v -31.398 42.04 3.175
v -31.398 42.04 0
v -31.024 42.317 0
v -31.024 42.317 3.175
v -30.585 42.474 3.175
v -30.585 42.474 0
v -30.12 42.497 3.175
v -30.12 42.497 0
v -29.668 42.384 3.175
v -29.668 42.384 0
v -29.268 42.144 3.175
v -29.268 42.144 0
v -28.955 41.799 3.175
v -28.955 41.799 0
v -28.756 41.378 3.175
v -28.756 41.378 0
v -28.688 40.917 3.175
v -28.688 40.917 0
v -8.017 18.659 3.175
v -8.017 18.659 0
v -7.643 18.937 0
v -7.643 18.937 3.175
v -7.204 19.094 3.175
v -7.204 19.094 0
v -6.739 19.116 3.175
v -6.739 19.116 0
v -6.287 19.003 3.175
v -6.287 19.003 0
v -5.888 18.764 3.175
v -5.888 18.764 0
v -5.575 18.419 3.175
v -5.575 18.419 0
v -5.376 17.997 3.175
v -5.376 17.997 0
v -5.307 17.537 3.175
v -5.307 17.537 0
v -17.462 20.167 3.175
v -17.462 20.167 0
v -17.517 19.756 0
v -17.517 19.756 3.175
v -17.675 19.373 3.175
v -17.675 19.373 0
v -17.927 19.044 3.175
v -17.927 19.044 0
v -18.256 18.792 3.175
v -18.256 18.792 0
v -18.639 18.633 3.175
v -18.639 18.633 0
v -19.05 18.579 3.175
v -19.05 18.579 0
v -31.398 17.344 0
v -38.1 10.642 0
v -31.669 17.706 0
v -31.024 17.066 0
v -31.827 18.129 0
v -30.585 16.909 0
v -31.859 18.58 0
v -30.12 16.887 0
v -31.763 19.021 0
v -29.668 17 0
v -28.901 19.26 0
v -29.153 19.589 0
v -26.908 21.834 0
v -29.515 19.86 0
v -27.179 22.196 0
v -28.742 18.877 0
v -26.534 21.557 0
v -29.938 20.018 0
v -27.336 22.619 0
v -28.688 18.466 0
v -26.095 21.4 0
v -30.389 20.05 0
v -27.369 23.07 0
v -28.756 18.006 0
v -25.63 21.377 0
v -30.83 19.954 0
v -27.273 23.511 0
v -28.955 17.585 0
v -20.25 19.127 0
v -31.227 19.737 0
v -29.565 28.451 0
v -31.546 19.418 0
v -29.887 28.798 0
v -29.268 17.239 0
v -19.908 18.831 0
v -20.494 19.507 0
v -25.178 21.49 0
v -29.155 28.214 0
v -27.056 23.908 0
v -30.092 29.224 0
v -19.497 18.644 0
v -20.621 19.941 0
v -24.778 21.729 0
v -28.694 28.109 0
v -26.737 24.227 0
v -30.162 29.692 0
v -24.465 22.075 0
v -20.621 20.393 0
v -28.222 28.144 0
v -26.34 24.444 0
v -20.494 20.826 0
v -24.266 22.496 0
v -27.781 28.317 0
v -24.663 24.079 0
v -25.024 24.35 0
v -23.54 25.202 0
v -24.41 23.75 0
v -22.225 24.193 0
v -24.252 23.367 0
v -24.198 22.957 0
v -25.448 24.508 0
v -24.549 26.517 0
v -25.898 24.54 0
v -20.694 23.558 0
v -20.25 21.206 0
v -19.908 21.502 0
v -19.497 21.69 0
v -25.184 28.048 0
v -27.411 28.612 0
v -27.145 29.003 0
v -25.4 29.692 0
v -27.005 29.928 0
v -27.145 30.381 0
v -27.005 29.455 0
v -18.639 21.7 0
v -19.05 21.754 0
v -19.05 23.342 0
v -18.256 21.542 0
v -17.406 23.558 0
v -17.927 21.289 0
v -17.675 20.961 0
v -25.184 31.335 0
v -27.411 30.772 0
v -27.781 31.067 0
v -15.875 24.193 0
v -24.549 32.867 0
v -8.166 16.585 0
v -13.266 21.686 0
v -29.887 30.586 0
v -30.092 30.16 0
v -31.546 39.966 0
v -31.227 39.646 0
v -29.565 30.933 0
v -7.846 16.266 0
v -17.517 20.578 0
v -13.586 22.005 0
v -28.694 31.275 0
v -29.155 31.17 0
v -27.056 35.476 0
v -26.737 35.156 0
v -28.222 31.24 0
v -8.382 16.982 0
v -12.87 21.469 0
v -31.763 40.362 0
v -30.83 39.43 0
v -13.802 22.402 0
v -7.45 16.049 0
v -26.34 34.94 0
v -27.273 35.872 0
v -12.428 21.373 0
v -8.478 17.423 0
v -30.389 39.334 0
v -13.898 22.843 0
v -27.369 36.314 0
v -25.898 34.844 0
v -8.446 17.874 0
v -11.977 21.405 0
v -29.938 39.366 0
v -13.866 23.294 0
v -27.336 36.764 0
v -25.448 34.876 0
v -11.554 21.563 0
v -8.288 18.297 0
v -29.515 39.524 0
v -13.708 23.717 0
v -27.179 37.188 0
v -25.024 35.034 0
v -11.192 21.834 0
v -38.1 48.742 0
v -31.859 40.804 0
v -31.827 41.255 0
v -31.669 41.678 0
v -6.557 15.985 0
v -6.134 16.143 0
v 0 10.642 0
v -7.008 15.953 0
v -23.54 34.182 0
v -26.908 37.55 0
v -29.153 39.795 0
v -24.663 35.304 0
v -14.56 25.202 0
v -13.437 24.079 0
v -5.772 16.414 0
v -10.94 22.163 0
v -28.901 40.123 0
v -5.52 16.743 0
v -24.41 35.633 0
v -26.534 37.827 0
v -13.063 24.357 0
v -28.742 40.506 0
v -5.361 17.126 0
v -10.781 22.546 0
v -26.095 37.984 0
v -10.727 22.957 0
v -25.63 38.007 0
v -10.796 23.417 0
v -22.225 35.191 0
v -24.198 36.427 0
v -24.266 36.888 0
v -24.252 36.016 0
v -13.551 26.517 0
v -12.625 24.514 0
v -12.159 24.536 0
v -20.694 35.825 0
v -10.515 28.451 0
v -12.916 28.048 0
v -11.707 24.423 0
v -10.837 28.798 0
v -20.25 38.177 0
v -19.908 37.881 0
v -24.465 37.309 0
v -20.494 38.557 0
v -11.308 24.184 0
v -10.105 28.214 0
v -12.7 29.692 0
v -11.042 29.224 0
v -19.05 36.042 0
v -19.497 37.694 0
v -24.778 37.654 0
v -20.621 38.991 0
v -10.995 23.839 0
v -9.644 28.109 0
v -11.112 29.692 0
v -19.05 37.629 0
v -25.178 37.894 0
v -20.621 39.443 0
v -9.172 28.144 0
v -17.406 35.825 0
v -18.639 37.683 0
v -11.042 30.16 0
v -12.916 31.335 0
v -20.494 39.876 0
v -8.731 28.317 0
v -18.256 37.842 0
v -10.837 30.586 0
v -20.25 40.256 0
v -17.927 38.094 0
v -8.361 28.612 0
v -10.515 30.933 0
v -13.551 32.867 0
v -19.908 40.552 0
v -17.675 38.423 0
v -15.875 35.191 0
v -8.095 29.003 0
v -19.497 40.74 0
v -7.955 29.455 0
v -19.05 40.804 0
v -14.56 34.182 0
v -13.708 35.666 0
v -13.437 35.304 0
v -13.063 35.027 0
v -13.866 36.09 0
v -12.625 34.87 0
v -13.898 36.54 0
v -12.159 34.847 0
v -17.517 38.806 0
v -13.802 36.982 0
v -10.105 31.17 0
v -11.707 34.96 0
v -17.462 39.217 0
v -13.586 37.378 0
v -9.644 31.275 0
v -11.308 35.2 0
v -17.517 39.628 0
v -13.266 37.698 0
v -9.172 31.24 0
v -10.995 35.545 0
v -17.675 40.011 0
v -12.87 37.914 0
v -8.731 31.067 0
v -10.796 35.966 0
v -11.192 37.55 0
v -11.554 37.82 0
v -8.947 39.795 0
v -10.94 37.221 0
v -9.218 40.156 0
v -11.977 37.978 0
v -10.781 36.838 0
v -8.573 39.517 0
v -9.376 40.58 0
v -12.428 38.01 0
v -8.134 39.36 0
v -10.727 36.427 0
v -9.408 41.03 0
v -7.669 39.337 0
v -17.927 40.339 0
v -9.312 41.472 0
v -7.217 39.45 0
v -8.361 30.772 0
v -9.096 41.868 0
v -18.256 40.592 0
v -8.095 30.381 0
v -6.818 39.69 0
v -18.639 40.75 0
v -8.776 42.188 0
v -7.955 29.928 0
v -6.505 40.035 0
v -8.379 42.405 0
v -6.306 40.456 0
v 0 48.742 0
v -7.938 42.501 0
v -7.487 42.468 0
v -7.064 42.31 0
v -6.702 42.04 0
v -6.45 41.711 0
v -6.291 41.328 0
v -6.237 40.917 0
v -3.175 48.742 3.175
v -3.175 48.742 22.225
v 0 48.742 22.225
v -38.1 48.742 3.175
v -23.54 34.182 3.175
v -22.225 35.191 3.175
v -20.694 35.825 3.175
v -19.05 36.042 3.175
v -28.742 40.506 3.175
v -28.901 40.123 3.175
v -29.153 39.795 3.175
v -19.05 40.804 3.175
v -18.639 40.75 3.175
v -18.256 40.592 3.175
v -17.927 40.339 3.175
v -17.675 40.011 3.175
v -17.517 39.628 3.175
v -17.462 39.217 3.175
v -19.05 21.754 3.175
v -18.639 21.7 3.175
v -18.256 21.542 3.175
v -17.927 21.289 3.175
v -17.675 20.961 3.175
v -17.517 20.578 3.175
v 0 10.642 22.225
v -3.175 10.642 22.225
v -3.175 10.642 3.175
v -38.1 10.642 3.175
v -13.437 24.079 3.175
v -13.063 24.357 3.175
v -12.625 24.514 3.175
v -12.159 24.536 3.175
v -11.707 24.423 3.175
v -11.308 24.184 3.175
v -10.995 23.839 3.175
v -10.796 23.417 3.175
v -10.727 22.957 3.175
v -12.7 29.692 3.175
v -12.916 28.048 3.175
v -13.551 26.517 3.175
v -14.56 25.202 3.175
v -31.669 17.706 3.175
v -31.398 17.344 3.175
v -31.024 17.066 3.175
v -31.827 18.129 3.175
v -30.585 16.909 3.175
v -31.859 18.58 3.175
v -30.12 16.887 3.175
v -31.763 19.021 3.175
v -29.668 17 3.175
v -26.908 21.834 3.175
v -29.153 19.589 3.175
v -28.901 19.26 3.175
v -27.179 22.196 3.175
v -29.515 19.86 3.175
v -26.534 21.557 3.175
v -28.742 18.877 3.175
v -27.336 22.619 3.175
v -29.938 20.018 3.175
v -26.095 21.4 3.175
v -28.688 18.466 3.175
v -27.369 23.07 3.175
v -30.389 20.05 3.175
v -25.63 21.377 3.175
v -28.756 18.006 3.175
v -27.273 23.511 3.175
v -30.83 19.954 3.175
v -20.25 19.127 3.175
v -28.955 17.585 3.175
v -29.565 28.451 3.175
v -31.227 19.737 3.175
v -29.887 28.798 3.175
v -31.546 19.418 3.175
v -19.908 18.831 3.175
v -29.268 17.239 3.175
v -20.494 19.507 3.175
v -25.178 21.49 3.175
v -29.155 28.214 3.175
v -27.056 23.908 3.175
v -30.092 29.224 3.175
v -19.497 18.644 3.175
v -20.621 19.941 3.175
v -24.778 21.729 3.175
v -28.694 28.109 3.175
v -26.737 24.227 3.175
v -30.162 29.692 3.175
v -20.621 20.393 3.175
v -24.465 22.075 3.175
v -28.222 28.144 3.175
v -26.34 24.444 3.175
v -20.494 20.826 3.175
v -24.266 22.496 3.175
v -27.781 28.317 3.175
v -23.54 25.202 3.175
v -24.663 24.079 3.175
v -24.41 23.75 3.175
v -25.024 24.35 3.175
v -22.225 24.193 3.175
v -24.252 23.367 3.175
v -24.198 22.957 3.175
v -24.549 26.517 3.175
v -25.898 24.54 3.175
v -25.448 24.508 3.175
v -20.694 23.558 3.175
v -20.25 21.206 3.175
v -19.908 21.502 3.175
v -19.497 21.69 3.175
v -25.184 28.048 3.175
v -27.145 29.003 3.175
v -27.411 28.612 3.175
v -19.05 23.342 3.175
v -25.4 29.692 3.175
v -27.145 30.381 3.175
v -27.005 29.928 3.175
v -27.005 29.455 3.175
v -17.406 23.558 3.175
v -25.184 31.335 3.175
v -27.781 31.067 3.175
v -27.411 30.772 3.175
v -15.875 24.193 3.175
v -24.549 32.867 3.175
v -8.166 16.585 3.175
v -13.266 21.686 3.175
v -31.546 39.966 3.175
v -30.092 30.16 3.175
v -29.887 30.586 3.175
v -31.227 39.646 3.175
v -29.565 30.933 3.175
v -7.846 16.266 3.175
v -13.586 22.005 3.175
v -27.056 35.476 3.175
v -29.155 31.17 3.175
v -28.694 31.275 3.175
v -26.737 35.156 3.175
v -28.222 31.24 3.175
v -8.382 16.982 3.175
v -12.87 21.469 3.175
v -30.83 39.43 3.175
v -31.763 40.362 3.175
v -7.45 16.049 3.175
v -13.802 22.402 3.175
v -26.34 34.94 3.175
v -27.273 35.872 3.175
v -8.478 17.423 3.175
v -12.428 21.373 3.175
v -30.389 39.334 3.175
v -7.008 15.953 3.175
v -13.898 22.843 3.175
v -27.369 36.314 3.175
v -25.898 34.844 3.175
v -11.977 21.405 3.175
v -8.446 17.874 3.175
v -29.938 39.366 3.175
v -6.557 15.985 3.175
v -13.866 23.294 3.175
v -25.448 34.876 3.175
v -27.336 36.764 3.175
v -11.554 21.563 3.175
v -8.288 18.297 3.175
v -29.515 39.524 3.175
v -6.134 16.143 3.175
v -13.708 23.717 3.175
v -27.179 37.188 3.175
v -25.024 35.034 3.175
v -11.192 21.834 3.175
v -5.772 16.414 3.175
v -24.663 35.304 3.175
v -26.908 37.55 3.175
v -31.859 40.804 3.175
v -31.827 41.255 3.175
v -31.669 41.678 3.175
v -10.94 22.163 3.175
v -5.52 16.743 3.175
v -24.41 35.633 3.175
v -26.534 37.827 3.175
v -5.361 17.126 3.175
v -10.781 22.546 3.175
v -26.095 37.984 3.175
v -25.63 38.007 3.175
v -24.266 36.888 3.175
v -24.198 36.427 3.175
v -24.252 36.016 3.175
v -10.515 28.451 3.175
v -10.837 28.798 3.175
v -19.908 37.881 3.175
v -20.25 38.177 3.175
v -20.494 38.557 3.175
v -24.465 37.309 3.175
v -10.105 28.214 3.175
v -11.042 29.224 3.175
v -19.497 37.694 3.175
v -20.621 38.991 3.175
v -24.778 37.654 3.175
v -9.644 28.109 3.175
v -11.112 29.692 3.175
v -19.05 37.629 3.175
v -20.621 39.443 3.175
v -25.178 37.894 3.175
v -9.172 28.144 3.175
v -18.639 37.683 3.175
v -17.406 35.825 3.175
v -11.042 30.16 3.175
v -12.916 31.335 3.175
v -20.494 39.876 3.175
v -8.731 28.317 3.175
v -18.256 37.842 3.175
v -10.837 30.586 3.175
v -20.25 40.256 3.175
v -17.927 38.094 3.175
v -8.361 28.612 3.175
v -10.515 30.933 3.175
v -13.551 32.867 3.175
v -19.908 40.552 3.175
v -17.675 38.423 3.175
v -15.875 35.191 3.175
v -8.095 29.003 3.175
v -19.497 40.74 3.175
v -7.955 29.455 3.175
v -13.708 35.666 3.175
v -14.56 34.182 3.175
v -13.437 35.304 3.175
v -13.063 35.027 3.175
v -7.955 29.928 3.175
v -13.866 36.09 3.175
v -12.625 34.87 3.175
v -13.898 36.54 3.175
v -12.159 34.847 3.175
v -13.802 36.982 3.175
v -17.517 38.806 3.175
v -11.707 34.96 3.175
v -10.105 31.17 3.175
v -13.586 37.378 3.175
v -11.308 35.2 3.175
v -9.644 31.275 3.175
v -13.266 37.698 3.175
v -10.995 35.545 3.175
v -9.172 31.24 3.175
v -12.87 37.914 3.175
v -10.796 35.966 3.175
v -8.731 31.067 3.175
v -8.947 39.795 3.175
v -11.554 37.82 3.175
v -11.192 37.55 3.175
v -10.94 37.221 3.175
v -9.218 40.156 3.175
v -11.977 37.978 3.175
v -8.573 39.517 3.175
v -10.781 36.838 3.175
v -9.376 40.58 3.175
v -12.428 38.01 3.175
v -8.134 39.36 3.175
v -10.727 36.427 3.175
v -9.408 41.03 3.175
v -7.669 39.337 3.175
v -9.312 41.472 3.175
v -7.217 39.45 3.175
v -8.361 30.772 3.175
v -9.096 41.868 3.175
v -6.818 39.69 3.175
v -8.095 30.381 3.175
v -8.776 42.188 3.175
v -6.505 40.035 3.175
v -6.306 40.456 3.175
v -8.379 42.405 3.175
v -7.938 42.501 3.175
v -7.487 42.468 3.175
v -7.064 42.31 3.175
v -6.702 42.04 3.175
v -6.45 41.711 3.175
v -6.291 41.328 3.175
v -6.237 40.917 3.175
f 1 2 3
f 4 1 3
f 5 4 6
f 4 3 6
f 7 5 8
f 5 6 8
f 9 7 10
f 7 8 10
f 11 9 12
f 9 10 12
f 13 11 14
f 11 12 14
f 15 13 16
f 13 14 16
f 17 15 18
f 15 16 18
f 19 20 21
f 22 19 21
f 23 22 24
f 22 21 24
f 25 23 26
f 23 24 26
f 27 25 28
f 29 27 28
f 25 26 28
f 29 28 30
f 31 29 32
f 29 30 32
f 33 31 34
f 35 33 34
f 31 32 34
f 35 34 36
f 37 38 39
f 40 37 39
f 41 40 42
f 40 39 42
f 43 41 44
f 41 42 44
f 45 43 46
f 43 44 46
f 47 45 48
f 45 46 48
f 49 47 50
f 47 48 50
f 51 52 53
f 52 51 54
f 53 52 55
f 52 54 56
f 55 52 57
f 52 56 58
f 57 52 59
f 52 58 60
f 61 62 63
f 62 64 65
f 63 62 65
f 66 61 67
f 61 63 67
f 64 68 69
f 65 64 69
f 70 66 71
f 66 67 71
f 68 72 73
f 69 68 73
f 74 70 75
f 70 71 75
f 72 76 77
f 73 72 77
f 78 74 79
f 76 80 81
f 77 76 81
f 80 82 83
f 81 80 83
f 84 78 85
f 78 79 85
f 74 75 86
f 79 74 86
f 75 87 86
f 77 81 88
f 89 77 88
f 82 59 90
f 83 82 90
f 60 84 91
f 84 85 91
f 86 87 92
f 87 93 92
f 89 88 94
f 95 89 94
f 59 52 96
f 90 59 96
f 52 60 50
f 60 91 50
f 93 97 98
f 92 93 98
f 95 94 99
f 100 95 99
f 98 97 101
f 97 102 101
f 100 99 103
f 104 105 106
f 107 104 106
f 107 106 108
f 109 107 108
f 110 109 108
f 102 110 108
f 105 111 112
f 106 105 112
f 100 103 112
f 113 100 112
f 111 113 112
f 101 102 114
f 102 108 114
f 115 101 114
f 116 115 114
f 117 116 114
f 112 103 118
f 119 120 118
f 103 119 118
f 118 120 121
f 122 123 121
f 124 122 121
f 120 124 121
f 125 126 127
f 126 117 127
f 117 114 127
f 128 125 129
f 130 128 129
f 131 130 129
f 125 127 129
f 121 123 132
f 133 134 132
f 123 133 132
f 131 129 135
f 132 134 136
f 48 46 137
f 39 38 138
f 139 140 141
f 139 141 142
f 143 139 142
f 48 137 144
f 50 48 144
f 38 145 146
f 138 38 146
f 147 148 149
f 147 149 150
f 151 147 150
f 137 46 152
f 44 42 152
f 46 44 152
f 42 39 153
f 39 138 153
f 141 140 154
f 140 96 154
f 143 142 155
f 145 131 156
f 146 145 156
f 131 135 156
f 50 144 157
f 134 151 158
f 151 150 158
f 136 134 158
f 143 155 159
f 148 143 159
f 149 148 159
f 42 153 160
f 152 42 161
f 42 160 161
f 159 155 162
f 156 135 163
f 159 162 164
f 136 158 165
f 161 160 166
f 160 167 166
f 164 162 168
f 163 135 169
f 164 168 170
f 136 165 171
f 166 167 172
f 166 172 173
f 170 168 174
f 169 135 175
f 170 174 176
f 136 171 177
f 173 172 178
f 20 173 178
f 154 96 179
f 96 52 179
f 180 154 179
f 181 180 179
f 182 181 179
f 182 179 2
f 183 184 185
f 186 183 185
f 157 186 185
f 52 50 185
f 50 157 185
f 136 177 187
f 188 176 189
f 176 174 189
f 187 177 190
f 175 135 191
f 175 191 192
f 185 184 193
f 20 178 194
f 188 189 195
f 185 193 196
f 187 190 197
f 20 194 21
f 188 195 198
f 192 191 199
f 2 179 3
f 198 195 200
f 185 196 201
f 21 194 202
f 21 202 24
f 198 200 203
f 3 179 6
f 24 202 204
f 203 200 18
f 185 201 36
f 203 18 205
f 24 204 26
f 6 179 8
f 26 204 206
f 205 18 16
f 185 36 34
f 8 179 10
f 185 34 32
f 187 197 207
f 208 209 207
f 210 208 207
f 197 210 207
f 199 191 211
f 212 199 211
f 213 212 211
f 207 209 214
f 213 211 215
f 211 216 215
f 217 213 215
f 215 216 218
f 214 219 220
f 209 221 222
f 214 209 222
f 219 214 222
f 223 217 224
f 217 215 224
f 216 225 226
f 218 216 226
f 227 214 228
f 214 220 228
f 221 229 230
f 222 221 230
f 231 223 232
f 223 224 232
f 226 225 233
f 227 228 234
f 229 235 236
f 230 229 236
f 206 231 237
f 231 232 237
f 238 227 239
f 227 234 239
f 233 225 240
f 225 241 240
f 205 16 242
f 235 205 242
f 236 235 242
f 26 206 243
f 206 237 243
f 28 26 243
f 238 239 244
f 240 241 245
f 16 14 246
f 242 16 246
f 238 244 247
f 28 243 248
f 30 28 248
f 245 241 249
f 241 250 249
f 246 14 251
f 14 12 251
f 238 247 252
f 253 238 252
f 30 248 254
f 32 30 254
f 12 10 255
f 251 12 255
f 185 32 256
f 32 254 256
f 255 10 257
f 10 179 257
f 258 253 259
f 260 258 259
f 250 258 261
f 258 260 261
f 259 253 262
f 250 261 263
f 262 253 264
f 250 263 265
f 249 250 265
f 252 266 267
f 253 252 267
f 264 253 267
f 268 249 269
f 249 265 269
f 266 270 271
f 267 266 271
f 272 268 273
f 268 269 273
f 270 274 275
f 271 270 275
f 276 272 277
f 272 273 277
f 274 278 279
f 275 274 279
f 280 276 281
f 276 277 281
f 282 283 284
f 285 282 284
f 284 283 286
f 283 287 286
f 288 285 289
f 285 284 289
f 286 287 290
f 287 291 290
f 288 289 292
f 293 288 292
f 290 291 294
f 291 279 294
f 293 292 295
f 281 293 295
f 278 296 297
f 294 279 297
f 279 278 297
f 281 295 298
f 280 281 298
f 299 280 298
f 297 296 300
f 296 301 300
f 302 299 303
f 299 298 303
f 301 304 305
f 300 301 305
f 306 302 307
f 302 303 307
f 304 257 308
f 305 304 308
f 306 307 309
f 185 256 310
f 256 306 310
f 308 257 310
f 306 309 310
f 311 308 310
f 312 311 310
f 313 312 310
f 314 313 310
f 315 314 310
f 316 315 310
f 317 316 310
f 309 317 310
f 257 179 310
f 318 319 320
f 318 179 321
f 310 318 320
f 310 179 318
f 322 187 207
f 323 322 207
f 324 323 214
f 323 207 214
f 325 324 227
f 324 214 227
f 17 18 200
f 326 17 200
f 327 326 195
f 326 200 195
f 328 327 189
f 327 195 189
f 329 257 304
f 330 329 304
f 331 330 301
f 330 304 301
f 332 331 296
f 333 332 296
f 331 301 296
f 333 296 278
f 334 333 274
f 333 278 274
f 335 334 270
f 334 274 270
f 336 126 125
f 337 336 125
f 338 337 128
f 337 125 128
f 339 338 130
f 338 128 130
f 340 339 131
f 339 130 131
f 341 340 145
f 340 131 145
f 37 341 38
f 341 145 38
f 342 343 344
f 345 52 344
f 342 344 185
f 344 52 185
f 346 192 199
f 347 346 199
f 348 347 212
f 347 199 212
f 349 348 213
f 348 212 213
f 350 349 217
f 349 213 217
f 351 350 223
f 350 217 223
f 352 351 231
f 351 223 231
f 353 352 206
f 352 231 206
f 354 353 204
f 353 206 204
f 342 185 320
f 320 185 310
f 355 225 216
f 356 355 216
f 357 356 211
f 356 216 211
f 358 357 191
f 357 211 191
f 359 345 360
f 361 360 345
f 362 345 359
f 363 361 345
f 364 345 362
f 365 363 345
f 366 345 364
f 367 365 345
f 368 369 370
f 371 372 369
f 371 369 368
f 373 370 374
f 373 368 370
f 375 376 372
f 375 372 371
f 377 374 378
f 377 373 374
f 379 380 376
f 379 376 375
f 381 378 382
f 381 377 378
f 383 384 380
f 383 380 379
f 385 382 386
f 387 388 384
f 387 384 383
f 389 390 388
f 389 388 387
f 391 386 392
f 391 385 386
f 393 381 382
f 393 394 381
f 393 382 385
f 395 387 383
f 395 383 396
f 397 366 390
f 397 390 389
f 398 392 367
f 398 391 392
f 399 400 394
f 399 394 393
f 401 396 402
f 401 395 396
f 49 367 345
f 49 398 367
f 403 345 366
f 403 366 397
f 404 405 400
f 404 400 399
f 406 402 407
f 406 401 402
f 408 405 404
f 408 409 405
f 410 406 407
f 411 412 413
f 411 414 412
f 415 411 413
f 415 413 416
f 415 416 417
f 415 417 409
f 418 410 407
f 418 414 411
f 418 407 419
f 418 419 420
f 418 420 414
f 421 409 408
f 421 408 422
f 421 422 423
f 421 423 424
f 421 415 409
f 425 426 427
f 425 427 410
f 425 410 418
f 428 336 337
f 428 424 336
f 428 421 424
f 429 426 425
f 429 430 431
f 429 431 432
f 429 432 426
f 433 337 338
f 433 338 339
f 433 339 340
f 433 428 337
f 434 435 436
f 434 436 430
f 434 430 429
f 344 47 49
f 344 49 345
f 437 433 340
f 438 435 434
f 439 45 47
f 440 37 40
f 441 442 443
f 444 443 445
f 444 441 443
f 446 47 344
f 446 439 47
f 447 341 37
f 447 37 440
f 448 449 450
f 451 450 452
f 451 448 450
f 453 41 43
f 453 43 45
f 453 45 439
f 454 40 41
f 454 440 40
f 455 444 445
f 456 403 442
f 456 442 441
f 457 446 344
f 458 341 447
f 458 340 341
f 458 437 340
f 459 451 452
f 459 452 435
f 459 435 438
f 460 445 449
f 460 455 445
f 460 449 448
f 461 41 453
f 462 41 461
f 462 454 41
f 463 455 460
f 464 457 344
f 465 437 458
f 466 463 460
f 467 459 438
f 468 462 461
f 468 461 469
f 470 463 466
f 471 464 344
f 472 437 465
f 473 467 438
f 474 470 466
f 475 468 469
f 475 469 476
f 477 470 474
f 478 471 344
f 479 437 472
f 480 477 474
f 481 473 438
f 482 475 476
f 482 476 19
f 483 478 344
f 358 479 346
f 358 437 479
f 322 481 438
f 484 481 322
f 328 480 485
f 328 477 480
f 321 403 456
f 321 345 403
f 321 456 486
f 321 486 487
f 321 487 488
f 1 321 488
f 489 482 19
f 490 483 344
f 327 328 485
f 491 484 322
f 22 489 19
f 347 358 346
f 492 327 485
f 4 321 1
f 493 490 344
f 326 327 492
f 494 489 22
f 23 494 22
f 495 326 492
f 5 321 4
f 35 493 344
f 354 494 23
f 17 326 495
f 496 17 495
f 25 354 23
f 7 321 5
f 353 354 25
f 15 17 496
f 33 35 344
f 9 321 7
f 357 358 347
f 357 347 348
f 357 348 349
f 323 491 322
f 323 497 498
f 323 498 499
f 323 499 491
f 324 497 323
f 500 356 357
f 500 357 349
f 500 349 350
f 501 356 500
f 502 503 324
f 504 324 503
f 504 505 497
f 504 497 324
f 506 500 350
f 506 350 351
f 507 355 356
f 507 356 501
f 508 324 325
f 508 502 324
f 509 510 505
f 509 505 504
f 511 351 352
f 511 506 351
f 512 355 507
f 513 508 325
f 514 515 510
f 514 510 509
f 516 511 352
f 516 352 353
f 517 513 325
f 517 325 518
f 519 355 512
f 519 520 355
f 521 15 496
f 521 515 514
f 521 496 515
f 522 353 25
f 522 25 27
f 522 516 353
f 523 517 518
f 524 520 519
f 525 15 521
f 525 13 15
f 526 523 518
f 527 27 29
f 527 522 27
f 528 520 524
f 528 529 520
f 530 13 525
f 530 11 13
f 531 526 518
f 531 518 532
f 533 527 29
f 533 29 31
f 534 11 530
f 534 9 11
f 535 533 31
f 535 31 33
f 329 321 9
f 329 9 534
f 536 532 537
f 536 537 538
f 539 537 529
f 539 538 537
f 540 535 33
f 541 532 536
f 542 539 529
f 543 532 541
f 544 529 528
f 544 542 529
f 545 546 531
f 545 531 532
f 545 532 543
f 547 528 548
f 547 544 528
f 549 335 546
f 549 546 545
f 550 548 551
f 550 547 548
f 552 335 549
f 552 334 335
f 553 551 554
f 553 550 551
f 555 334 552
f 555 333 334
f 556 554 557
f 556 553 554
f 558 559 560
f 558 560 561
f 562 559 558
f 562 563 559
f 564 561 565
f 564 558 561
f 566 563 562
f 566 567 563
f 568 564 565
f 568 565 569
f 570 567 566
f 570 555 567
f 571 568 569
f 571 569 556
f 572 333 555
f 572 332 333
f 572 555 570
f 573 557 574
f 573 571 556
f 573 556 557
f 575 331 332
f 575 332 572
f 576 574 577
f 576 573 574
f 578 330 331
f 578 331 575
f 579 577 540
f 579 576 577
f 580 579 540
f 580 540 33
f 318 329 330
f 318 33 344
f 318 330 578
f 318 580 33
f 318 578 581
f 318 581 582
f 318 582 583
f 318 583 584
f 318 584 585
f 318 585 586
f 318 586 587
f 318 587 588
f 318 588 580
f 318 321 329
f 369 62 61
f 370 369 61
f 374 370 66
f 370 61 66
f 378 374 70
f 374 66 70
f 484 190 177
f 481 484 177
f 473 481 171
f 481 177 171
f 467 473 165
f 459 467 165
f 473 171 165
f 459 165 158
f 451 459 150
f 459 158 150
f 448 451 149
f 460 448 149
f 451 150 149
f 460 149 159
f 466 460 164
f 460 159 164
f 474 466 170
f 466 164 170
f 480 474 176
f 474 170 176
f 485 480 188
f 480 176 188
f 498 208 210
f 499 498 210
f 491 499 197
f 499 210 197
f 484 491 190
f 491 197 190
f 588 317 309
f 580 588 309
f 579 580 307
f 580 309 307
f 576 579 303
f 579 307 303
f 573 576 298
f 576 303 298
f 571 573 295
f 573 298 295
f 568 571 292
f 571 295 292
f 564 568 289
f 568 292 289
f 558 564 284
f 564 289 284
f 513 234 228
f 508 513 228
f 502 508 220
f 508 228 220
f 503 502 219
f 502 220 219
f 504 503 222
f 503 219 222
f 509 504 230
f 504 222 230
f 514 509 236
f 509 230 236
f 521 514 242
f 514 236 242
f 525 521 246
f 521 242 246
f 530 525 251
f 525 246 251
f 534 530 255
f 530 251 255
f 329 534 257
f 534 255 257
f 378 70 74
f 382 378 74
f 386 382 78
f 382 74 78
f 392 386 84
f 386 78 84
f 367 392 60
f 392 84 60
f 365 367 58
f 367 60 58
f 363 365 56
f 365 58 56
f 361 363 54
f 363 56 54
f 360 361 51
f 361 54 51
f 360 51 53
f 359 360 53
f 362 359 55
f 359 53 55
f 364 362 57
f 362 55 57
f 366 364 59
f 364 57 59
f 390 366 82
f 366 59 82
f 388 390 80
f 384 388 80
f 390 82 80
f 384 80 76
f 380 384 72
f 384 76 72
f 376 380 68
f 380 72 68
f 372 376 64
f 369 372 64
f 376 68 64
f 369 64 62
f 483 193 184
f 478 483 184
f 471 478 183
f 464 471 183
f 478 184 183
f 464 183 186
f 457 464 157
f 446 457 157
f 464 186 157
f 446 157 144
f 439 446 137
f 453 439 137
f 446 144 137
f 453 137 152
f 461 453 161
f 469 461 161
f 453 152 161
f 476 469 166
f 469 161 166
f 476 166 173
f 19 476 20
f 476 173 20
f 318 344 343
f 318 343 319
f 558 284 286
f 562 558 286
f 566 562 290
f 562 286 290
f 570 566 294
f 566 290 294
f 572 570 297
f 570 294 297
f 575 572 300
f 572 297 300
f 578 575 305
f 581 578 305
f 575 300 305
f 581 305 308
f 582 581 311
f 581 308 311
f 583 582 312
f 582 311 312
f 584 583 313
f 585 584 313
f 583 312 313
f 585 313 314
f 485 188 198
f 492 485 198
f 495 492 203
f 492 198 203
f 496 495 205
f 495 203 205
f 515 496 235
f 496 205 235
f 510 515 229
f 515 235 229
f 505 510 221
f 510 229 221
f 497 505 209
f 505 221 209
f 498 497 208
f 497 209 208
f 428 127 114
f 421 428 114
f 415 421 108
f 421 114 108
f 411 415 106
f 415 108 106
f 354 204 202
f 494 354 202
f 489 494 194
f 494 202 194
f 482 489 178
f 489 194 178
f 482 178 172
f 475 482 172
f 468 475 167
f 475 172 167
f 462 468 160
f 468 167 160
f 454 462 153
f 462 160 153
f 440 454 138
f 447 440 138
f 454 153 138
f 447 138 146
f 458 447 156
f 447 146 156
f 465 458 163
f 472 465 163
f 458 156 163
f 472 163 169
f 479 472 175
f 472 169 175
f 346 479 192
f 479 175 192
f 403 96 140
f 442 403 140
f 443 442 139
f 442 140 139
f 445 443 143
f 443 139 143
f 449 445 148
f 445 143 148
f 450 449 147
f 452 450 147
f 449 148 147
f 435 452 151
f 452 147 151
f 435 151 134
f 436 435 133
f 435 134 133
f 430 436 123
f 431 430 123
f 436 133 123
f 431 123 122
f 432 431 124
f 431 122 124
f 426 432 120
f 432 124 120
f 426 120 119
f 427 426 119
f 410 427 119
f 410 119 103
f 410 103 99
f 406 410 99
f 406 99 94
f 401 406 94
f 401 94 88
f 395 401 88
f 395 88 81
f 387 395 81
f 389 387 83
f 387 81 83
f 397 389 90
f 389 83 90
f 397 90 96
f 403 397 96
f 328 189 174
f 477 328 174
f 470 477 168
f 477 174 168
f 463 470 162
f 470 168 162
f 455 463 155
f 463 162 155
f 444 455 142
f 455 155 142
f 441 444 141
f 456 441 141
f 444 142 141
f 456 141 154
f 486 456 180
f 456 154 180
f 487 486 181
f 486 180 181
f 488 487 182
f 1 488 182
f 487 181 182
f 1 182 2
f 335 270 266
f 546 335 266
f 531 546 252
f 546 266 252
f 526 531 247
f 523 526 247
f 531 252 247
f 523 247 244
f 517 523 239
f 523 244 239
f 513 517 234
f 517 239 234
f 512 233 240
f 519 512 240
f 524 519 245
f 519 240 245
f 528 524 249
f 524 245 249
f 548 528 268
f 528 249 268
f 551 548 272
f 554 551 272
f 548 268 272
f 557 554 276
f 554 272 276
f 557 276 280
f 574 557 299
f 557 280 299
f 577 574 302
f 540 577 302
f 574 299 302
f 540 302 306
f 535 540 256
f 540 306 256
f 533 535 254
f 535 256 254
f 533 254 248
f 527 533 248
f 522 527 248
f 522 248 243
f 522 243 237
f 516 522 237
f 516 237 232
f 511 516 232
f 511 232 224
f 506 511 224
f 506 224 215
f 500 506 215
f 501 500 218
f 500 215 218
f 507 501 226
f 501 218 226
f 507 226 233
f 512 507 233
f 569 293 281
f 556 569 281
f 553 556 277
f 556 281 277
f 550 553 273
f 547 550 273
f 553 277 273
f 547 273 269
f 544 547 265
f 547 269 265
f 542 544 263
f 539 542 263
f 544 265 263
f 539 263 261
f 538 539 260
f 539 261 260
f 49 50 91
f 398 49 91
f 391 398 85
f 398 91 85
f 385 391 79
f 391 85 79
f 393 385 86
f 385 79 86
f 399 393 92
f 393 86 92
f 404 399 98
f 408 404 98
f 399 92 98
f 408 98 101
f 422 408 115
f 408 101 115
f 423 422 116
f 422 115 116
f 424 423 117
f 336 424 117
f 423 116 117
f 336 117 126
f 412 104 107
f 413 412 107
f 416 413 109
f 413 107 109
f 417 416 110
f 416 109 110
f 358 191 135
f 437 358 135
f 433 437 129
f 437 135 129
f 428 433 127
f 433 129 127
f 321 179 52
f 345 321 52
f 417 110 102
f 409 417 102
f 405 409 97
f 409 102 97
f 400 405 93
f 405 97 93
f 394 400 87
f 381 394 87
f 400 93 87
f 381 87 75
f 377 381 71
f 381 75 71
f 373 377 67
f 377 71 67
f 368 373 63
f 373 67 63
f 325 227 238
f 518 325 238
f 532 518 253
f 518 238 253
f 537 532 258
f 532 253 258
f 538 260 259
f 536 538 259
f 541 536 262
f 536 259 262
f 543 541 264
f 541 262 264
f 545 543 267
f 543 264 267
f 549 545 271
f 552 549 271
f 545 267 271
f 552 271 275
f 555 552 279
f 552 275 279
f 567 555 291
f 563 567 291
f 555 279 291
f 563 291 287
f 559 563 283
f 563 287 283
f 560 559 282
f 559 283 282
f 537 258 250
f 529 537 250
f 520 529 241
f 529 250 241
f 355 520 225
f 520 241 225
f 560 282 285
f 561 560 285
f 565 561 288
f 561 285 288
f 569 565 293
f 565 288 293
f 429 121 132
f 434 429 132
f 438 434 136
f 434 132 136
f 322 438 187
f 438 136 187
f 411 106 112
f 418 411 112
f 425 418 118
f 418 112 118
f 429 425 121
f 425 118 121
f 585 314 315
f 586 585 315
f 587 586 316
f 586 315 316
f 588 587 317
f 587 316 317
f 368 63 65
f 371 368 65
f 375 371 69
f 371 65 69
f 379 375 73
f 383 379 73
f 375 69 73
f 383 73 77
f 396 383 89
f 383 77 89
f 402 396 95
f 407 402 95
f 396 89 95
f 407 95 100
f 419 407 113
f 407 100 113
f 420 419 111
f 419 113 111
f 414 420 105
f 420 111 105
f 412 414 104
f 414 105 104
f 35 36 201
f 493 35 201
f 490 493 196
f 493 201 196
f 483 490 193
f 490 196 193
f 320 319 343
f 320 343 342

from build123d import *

# Parameters (mm, degrees)
F1_DEPTH = 3.175
F2_W     = 3.175
F2_H     = 38.1
F3_DEPTH = 19.05


with BuildPart() as f1:
    # F0 (on Top) → F1 (new body)
    with BuildSketch(Plane.XY):
        with BuildLine():
            Line((0, 10.6418100238), (0, 29.6918100238))
            Line((0, 29.6918100238), (-7.9375, 29.6918100238))
            ThreePointArc((-7.9375, 29.6918100238), (-9.525, 28.1043100238), (-11.1125, 29.6918100238))
            Line((-11.1125, 29.6918100238), (-12.7, 29.6918100238))
            ThreePointArc((-12.7, 29.6918100238), (-13.1833649686, 27.2617702283), (-14.5598719395, 25.2016819633))
            Line((-14.5598719395, 25.2016819633), (-13.4373399243, 24.0791499481))
            ThreePointArc((-13.4373399243, 24.0791499481), (-11.7072979603, 24.4232766908), (-10.7273079092, 22.956617933))
            ThreePointArc((-10.7273079092, 22.956617933), (-10.8481491513, 22.3491079841), (-11.1922758941, 21.8340859178))
            Line((-11.1922758941, 21.8340859178), (-8.0172758941, 18.6590859178))
            ThreePointArc((-8.0172758941, 18.6590859178), (-6.2872339301, 19.0032126606), (-5.3072438789, 17.5365539027))
            ThreePointArc((-5.3072438789, 17.5365539027), (-5.4280851211, 16.9290439538), (-5.7722118638, 16.4140218876))
            Line((-5.7722118638, 16.4140218876), (0, 10.6418100238))
        make_face()
        with BuildLine():
            Line((-19.05, 18.5793100238), (-19.05, 10.6418100238))
            Line((-19.05, 10.6418100238), (0, 10.6418100238))
            Line((0, 10.6418100238), (-5.7722118638, 16.4140218876))
            ThreePointArc((-5.7722118638, 16.4140218876), (-8.0172758941, 16.4140218876), (-8.0172758941, 18.6590859178))
            Line((-8.0172758941, 18.6590859178), (-11.1922758941, 21.8340859178))
            ThreePointArc((-11.1922758941, 21.8340859178), (-13.4373399243, 21.8340859178), (-13.4373399243, 24.0791499481))
            Line((-13.4373399243, 24.0791499481), (-14.5598719395, 25.2016819633))
            ThreePointArc((-14.5598719395, 25.2016819633), (-16.6199602045, 23.8251749923), (-19.05, 23.3418100238))
            Line((-19.05, 23.3418100238), (-19.05, 21.7543100238))
            ThreePointArc((-19.05, 21.7543100238), (-17.9274679849, 21.2893420389), (-17.4625, 20.1668100238))
            ThreePointArc((-17.4625, 20.1668100238), (-17.9274679849, 19.0442780087), (-19.05, 18.5793100238))
        make_face()
        with BuildLine():
            Line((-31.3978521665, 17.3439578573), (-38.1, 10.6418100238))
            Line((-38.1, 10.6418100238), (-19.05, 10.6418100238))
            Line((-19.05, 10.6418100238), (-19.05, 18.5793100238))
            ThreePointArc((-19.05, 18.5793100238), (-20.6375, 20.1668100238), (-19.05, 21.7543100238))
            Line((-19.05, 21.7543100238), (-19.05, 23.3418100238))
            ThreePointArc((-19.05, 23.3418100238), (-21.4800397955, 23.8251749923), (-23.5401280605, 25.2016819632))
            Line((-23.5401280605, 25.2016819633), (-24.6626600757, 24.0791499481))
            ThreePointArc((-24.6626600757, 24.0791499481), (-24.3185333329, 23.5641278819), (-24.1976920908, 22.956617933))
            ThreePointArc((-24.1976920908, 22.956617933), (-25.1776821419, 21.4899591751), (-26.9077241059, 21.8340859178))
            Line((-26.9077241059, 21.8340859178), (-29.1527881362, 19.5890218876))
            ThreePointArc((-29.1527881362, 19.5890218876), (-28.8086613935, 19.0739998213), (-28.6878201513, 18.4664898724))
            ThreePointArc((-28.6878201513, 18.4664898724), (-29.6678102025, 16.9998311146), (-31.3978521665, 17.3439578573))
        make_face()
        with BuildLine():
            Line((-30.1625, 29.6918100238), (-38.1, 29.6918100238))
            Line((-38.1, 29.6918100238), (-38.1, 10.6418100238))
            Line((-38.1, 10.6418100238), (-31.3978521665, 17.3439578573))
            ThreePointArc((-31.3978521665, 17.3439578573), (-31.3978521665, 19.5890218876), (-29.1527881362, 19.5890218876))
            Line((-29.1527881362, 19.5890218876), (-26.9077241059, 21.8340859178))
            ThreePointArc((-26.9077241059, 21.8340859178), (-26.9077241059, 24.0791499481), (-24.6626600757, 24.0791499481))
            Line((-24.6626600757, 24.0791499481), (-23.5401280605, 25.2016819633))
            ThreePointArc((-23.5401280605, 25.2016819632), (-24.9166350314, 27.2617702283), (-25.4, 29.6918100238))
            Line((-25.4, 29.6918100238), (-26.9875, 29.6918100238))
            ThreePointArc((-26.9875, 29.6918100238), (-28.575, 28.1043100238), (-30.1625, 29.6918100238))
        make_face()
        with BuildLine():
            Line((-31.3978521665, 42.0396621903), (-38.1, 48.7418100238))
            Line((-38.1, 48.7418100238), (-38.1, 29.6918100238))
            Line((-38.1, 29.6918100238), (-30.1625, 29.6918100238))
            ThreePointArc((-30.1625, 29.6918100238), (-28.575, 31.2793100238), (-26.9875, 29.6918100238))
            Line((-26.9875, 29.6918100238), (-25.4, 29.6918100238))
            ThreePointArc((-25.4, 29.6918100238), (-24.9166350314, 32.1218498193), (-23.5401280605, 34.1819380843))
            Line((-23.5401280605, 34.1819380843), (-24.6626600757, 35.3044700995))
            ThreePointArc((-24.6626600757, 35.3044700995), (-26.9077241059, 35.3044700995), (-26.9077241059, 37.5495341297))
            Line((-26.9077241059, 37.5495341297), (-29.1527881362, 39.79459816))
            ThreePointArc((-29.1527881362, 39.79459816), (-31.3978521665, 39.79459816), (-31.3978521665, 42.0396621903))
        make_face()
        with BuildLine():
            Line((-19.05, 48.7418100238), (-38.1, 48.7418100238))
            Line((-38.1, 48.7418100238), (-31.3978521665, 42.0396621903))
            ThreePointArc((-31.3978521665, 42.0396621903), (-29.6678102025, 42.383788933), (-28.6878201513, 40.9171301751))
            ThreePointArc((-28.6878201513, 40.9171301751), (-28.8086613935, 40.3096202262), (-29.1527881362, 39.79459816))
            Line((-29.1527881362, 39.79459816), (-26.9077241059, 37.5495341297))
            ThreePointArc((-26.9077241059, 37.5495341297), (-25.1776821419, 37.8936608724), (-24.1976920908, 36.4270021146))
            ThreePointArc((-24.1976920908, 36.4270021146), (-24.3185333329, 35.8194921657), (-24.6626600757, 35.3044700995))
            Line((-24.6626600757, 35.3044700995), (-23.5401280605, 34.1819380843))
            ThreePointArc((-23.5401280605, 34.1819380843), (-21.4800397955, 35.5584450552), (-19.05, 36.0418100238))
            Line((-19.05, 36.0418100238), (-19.05, 37.6293100238))
            ThreePointArc((-19.05, 37.6293100238), (-20.6375, 39.2168100238), (-19.05, 40.8043100238))
            Line((-19.05, 40.8043100238), (-19.05, 48.7418100238))
        make_face()
        with BuildLine():
            Line((0, 48.7418100238), (-19.05, 48.7418100238))
            Line((-19.05, 48.7418100238), (-19.05, 40.8043100238))
            ThreePointArc((-19.05, 40.8043100238), (-17.9274679849, 40.3393420389), (-17.4625, 39.2168100238))
            ThreePointArc((-17.4625, 39.2168100238), (-17.9274679849, 38.0942780087), (-19.05, 37.6293100238))
            Line((-19.05, 37.6293100238), (-19.05, 36.0418100238))
            ThreePointArc((-19.05, 36.0418100238), (-16.6199602045, 35.5584450552), (-14.5598719395, 34.1819380843))
            Line((-14.5598719395, 34.1819380843), (-13.4373399243, 35.3044700995))
            ThreePointArc((-13.4373399243, 35.3044700995), (-13.4373399243, 37.5495341297), (-11.1922758941, 37.5495341297))
            Line((-11.1922758941, 37.5495341297), (-8.9472118638, 39.79459816))
            ThreePointArc((-8.9472118638, 39.79459816), (-8.9472118638, 42.0396621903), (-6.7021478335, 42.0396621903))
            Line((-6.7021478335, 42.0396621903), (0, 48.7418100238))
        make_face()
        with BuildLine():
            Line((0, 29.6918100238), (0, 48.7418100238))
            Line((0, 48.7418100238), (-6.7021478335, 42.0396621903))
            ThreePointArc((-6.7021478335, 42.0396621903), (-6.3580210908, 41.524640124), (-6.2371798487, 40.9171301751))
            ThreePointArc((-6.2371798487, 40.9171301751), (-7.2171698998, 39.4504714173), (-8.9472118638, 39.79459816))
            Line((-8.9472118638, 39.79459816), (-11.1922758941, 37.5495341297))
            ThreePointArc((-11.1922758941, 37.5495341297), (-10.8481491513, 37.0345120635), (-10.7273079092, 36.4270021146))
            ThreePointArc((-10.7273079092, 36.4270021146), (-11.7072979603, 34.9603433567), (-13.4373399243, 35.3044700995))
            Line((-13.4373399243, 35.3044700995), (-14.5598719395, 34.1819380843))
            ThreePointArc((-14.5598719395, 34.1819380843), (-13.1833649686, 32.1218498193), (-12.7, 29.6918100238))
            Line((-12.7, 29.6918100238), (-11.1125, 29.6918100238))
            ThreePointArc((-11.1125, 29.6918100238), (-9.525, 31.2793100238), (-7.9375, 29.6918100238))
            Line((-7.9375, 29.6918100238), (0, 29.6918100238))
        make_face()
    extrude(amount=F1_DEPTH)

    # F2 (on face) → F3 (join)
    with BuildSketch(Plane.XY.offset(3.175)):
        with Locations((-1.5875, 29.6918100238)):
            Rectangle(F2_W, F2_H)
    extrude(amount=F3_DEPTH)


solid = f1.part
